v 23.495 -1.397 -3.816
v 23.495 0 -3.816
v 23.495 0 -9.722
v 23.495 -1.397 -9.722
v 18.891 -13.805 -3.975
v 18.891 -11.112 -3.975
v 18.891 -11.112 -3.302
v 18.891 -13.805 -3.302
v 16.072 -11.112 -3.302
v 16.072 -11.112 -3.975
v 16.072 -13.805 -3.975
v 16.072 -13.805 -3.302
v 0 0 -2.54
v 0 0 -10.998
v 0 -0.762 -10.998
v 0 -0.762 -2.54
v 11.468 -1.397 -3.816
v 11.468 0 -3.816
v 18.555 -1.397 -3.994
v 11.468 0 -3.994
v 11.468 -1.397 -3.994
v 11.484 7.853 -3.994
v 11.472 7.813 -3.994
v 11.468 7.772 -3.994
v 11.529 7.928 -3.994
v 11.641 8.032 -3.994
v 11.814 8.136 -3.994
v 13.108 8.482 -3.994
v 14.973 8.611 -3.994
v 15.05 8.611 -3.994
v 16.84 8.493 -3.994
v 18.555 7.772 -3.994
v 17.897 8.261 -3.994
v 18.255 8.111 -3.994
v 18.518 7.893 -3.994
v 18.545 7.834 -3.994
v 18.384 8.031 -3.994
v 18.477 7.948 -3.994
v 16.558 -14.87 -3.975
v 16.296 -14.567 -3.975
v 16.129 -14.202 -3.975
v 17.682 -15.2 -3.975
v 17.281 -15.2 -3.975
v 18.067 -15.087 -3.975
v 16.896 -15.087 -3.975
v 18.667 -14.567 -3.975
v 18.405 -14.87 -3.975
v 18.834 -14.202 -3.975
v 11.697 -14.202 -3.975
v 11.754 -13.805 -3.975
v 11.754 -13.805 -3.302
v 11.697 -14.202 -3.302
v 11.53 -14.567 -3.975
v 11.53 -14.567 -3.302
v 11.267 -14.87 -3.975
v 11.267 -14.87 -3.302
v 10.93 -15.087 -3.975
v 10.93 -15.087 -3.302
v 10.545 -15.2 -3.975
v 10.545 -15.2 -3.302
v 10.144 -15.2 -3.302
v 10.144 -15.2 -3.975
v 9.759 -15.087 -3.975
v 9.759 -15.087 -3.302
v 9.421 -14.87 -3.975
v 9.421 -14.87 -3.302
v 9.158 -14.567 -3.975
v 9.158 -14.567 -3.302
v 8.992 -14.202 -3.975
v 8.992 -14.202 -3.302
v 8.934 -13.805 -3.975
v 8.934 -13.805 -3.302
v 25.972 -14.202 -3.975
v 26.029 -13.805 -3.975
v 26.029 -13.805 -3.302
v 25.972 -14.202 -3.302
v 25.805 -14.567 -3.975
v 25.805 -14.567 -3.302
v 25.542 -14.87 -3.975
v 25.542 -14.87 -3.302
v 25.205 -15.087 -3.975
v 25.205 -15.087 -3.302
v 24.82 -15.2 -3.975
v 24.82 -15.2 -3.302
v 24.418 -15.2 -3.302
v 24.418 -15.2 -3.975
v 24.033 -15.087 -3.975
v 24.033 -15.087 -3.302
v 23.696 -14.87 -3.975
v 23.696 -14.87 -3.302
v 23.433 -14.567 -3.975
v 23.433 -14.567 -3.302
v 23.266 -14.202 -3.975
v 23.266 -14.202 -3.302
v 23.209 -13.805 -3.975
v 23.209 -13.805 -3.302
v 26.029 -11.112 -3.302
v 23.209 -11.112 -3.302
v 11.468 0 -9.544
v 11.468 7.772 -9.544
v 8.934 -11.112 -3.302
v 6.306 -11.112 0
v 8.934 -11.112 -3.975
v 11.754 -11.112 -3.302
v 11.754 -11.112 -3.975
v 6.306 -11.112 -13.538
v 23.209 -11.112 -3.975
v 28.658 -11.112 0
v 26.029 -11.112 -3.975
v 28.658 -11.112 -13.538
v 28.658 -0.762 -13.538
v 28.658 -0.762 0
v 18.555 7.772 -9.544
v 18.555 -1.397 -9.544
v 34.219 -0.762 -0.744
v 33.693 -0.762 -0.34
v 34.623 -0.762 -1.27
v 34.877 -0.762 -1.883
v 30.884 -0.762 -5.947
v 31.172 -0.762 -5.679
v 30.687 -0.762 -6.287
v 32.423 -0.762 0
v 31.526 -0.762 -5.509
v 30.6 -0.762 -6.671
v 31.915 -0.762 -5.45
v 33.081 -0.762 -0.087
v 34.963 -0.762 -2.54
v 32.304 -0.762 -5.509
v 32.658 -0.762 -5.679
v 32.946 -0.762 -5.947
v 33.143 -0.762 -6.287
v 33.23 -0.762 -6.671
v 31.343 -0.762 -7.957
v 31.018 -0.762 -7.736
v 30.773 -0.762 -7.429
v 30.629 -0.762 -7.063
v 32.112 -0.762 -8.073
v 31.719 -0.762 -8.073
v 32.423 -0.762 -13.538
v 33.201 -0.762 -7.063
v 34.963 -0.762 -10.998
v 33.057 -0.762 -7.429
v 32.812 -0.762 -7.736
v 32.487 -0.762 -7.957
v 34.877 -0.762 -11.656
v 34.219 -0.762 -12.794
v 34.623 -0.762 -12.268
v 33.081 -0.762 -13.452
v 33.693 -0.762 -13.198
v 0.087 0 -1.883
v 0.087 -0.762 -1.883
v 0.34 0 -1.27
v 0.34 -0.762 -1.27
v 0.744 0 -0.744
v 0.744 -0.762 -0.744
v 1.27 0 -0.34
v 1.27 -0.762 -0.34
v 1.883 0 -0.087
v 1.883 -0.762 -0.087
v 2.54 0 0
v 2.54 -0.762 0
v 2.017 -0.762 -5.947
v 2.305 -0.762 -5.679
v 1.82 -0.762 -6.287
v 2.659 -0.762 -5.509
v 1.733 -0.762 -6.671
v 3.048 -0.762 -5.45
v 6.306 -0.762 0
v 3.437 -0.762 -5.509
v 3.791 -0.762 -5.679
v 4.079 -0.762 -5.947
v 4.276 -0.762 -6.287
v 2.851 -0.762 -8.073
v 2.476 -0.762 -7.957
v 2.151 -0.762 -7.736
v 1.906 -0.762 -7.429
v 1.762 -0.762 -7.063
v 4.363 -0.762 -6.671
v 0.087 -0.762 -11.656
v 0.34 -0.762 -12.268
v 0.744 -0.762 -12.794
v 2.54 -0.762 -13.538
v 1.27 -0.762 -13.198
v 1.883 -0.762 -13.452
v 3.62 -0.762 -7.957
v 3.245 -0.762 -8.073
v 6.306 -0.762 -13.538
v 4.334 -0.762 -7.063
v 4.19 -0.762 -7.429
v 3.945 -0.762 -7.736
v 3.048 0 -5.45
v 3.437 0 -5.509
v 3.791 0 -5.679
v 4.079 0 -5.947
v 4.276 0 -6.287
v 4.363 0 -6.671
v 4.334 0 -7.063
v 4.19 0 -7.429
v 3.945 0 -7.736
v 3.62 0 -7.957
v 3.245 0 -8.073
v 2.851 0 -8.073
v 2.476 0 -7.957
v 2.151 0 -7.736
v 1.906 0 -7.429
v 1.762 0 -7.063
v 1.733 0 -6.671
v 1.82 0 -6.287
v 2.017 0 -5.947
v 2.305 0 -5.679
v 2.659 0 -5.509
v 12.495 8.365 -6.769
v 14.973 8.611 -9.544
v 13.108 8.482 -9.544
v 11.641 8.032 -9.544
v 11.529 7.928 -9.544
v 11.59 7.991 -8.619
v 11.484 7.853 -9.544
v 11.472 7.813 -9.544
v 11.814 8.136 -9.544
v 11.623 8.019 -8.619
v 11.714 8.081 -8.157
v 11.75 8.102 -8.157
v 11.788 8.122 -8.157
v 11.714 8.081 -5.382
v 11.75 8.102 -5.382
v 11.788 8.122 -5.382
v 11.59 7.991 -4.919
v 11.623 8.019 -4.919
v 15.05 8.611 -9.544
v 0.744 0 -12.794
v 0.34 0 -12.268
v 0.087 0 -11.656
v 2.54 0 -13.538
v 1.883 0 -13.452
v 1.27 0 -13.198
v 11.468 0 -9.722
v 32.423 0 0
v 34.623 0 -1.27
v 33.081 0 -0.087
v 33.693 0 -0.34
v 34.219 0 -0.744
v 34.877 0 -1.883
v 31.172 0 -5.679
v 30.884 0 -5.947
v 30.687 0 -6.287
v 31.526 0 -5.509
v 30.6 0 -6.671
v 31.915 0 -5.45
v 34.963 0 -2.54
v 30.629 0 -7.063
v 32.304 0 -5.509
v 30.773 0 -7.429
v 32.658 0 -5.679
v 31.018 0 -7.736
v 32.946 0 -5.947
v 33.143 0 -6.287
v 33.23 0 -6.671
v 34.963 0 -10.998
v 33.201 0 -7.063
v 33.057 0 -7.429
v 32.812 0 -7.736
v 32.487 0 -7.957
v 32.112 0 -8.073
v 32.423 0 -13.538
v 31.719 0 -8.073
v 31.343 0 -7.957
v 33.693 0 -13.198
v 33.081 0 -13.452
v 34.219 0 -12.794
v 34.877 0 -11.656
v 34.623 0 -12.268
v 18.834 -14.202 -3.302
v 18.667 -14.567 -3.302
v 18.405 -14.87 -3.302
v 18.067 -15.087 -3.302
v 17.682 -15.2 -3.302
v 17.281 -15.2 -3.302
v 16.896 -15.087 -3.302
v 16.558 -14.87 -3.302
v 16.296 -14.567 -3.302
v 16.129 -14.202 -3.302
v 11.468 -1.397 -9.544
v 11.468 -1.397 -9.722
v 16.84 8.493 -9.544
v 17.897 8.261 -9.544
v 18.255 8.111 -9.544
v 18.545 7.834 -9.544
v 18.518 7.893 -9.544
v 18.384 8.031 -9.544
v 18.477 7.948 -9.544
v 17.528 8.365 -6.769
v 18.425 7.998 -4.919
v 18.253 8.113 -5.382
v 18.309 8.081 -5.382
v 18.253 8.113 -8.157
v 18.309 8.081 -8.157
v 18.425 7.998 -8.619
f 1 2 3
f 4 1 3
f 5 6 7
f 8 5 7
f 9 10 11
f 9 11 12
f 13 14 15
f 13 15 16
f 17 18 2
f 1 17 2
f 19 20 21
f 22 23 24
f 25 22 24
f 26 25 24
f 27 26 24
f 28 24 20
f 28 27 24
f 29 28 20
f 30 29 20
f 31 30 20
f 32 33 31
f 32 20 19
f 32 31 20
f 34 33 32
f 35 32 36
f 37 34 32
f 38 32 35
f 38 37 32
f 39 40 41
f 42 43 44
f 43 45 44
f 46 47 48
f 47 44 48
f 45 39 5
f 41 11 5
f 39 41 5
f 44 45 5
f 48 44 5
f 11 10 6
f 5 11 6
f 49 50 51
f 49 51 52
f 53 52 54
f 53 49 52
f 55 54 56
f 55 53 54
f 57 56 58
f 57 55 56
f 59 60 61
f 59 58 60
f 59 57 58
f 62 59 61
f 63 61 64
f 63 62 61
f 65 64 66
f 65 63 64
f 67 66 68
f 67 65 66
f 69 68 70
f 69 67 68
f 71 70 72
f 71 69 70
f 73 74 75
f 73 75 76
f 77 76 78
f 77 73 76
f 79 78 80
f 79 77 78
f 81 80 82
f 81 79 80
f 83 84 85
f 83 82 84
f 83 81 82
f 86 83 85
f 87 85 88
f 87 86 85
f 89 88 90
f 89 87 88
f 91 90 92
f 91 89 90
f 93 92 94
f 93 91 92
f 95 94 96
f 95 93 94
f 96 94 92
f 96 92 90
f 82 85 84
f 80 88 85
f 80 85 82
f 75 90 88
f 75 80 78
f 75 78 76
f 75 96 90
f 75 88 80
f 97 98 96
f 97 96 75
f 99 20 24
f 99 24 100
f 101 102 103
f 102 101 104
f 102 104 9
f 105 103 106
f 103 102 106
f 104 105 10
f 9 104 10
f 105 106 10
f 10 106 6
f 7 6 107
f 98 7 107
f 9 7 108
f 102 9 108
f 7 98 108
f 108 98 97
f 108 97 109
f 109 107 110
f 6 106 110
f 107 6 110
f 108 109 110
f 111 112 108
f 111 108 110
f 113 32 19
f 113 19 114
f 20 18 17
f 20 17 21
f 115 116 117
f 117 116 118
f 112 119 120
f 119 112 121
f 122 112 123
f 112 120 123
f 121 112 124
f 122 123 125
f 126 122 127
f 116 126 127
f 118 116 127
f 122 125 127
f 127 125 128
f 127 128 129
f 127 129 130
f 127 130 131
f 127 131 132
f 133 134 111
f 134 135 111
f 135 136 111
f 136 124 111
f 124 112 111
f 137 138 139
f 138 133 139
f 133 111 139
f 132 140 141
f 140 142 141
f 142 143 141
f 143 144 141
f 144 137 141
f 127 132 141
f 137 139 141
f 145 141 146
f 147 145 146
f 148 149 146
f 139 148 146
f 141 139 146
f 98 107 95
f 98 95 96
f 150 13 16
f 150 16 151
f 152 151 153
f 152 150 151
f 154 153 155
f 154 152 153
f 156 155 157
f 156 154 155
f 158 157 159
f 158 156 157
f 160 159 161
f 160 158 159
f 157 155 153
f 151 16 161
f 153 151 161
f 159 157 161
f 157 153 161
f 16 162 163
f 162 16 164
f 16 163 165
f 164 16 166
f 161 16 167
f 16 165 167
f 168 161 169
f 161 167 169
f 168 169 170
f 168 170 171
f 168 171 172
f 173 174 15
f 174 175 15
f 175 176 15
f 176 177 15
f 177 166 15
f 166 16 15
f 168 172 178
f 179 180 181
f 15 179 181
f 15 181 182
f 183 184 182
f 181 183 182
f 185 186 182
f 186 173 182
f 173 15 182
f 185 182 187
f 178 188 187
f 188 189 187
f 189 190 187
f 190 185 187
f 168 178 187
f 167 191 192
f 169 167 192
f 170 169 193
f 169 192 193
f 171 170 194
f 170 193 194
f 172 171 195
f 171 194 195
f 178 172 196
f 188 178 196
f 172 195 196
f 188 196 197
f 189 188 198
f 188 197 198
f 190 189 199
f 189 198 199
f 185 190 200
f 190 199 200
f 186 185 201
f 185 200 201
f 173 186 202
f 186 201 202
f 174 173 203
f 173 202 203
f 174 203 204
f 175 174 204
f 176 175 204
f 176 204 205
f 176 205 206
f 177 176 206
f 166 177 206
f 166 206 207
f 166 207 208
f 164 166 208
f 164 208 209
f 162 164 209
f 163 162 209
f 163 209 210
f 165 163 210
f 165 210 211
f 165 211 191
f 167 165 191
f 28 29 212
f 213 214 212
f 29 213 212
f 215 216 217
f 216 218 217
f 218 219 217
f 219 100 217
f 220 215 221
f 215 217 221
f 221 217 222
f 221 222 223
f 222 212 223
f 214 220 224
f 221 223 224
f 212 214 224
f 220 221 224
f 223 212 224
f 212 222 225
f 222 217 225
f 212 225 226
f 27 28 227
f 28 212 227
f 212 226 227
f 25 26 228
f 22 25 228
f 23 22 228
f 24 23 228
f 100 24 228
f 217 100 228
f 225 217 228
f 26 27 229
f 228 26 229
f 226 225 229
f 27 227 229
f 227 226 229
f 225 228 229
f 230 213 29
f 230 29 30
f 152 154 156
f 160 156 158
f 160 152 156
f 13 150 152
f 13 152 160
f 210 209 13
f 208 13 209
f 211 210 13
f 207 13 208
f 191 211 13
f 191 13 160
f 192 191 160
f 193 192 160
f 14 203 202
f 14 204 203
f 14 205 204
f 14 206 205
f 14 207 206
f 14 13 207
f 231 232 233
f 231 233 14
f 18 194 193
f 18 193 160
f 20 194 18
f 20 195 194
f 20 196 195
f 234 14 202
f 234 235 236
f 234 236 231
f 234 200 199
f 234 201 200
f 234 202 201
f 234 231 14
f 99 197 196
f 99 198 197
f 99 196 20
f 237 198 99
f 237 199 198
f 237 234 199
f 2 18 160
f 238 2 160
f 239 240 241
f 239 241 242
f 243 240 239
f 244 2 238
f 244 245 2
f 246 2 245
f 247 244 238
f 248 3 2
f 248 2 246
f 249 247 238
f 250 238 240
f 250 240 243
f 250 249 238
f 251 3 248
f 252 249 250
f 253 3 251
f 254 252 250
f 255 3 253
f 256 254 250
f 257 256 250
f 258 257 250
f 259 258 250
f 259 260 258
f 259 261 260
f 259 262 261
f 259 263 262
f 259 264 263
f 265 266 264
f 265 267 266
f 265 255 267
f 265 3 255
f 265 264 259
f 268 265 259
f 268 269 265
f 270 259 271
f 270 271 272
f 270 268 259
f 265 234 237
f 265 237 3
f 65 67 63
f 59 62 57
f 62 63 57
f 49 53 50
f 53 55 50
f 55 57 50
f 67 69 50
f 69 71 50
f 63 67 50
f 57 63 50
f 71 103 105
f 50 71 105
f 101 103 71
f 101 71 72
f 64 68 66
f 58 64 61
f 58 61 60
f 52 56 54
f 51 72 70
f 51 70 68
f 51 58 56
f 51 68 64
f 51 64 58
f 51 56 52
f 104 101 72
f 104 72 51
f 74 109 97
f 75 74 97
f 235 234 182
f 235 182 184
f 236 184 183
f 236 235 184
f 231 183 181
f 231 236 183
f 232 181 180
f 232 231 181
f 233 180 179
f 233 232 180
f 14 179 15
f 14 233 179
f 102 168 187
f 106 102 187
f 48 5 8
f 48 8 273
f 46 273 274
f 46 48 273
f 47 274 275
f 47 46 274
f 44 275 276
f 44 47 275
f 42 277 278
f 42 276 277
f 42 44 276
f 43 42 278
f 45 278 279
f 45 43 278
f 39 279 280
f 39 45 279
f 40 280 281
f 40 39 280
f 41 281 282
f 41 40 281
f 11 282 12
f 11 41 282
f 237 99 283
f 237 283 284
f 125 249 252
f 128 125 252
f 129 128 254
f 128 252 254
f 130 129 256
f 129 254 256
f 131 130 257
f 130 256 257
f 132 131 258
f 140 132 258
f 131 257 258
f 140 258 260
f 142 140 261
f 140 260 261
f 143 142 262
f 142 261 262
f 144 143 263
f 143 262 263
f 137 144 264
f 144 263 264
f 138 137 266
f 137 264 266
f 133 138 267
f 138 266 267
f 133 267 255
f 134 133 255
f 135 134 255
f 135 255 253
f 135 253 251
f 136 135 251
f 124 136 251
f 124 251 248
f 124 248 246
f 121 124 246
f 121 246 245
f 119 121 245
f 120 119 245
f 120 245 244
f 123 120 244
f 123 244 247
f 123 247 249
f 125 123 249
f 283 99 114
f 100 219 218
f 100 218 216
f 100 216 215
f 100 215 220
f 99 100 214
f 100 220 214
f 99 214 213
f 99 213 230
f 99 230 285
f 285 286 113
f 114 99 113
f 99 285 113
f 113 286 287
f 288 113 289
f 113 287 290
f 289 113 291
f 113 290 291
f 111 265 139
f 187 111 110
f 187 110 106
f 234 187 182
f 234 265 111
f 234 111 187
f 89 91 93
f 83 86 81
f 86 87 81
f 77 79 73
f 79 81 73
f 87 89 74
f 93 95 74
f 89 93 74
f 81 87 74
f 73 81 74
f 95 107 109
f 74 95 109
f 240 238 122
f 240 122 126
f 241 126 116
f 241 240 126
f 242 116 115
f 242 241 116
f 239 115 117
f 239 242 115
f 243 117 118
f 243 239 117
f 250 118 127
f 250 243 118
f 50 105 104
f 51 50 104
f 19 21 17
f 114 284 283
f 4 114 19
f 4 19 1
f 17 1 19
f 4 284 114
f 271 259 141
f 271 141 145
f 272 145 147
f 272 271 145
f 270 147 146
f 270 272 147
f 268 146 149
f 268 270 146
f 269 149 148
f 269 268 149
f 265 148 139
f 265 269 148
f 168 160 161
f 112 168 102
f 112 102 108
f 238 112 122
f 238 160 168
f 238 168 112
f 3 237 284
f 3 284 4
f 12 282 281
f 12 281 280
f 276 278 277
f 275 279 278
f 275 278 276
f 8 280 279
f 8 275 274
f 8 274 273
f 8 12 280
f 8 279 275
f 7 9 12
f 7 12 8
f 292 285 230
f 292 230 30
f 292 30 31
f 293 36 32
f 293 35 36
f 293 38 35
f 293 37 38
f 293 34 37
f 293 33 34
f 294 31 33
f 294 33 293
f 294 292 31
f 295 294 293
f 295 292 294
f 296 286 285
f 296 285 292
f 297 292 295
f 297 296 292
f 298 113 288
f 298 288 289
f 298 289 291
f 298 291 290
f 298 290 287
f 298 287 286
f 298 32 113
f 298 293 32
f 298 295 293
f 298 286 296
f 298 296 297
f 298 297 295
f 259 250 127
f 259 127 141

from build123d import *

# Parameters (mm, degrees)
BOSS_EXTRUDE1_DEPTH             = 0.762
SKETCH2_W                       = 22.352
SKETCH2_H                       = 13.5382
BOSS_EXTRUDE2_DEPTH             = 11.1125
SKETCH6_W                       = 12.0269
SKETCH6_H                       = 5.9055
CUT_EXTRUDE2_DEPTH              = 1.397
SKETCH3_W                       = 7.0866
SKETCH3_H                       = 5.5499
BOSS_EXTRUDE3_DEPTH             = 8.6106
BOSS_EXTRUDE3_DIRECTION_2_REACH = 41.105
FILLET4_SIZE                    = 3.5052
FILLET4_SIZE_2                  = 0.8382
SKETCH4_R                       = 1.318988248
CUT_EXTRUDE1_DEPTH              = 40.104844676
SKETCH5_W                       = 2.8194
SKETCH5_H                       = 0.6731
BOSS_EXTRUDE4_DEPTH             = 4.1021
FILLET5_RADIUS                  = 1.4097
FILLET5_LENGTH                  = 0.6731
FILLET6_RADIUS                  = 1.4097
FILLET6_LENGTH                  = 0.6731
FILLET7_RADIUS                  = 1.4097
FILLET7_LENGTH                  = 0.6731


with BuildPart() as part:
    # Sketch1 → Boss-Extrude1 (new body)
    with BuildSketch(Plane(origin=(0, 0, 0), x_dir=(1, 0, 0), z_dir=(0, 1, 0))):
        with BuildLine():
            Line((2.54, 0), (32.4231, 0))
            ThreePointArc((32.4231, 0), (34.219151224, 0.743948776), (34.9631, 2.54))
            Line((34.9631, 2.54), (34.9631, 10.9982))
            ThreePointArc((34.9631, 10.9982), (34.219151224, 12.794251224), (32.4231, 13.5382))
            Line((32.4231, 13.5382), (2.54, 13.5382))
            ThreePointArc((2.54, 13.5382), (0.743948776, 12.794251224), (0, 10.9982))
            Line((0, 10.9982), (0, 2.54))
            ThreePointArc((0, 2.54), (0.743948776, 0.743948776), (2.54, 0))
        make_face()
    extrude(amount=-BOSS_EXTRUDE1_DEPTH)

    # Sketch2 → Boss-Extrude2 (add)
    with BuildSketch(Plane(origin=(0, 0, 0), x_dir=(1, 0, 0), z_dir=(0, 1, 0))):
        with Locations((17.48155, 6.7691)):
            Rectangle(SKETCH2_W, SKETCH2_H)
    extrude(amount=-BOSS_EXTRUDE2_DEPTH)

    # Sketch6 → Cut-Extrude2 (cut)
    with BuildSketch(Plane(origin=(0, 0, 0), x_dir=(1, 0, 0), z_dir=(0, 1, 0))):
        with Locations((17.48155, 6.7691)):
            Rectangle(SKETCH6_W, SKETCH6_H)
    extrude(amount=-CUT_EXTRUDE2_DEPTH, mode=Mode.SUBTRACT)

    # Sketch3 → Boss-Extrude3 (add)
    with BuildSketch(Plane(origin=(0, 0, 0), x_dir=(1, 0, 0), z_dir=(0, 1, 0))):
        with Locations((15.0114, 6.7691)):
            Rectangle(SKETCH3_W, SKETCH3_H)
    extrude(amount=BOSS_EXTRUDE3_DEPTH)

    # Sketch3 → Boss-Extrude3 direction 2 (add, up to next)
    with BuildSketch(Plane(origin=(0, 0, 0), x_dir=(1, 0, 0), z_dir=(0, 1, 0)), mode=Mode.PRIVATE) as boss_extrude3_direction_2_sk1:
        with Locations((15.0114, 6.7691)):
            Rectangle(SKETCH3_W, SKETCH3_H)
    boss_extrude3_direction_2_tool1 = extrude(boss_extrude3_direction_2_sk1.sketch, amount=-BOSS_EXTRUDE3_DIRECTION_2_REACH, mode=Mode.PRIVATE) - part.part
    add(boss_extrude3_direction_2_tool1.solids().sort_by_distance((15.0114, 0, -6.7691))[0])

    # Fillet4
    # an asymmetric fillet: 3.5052, 0.8382 mm, written as the material it takes off along each edge
    with BuildSketch(Plane(origin=(18.5547, 8.6106, -18.30705), x_dir=(-1, 0, 0), z_dir=(0, 0, 1))) as fillet4_piece_1:
        with BuildLine():
            Bezier((FILLET4_SIZE, 0), (0, 0), (0, FILLET4_SIZE_2), weights=[1, 0.707106781, 1])
            Line((0, FILLET4_SIZE_2), (0, 0))
            Line((0, 0), (FILLET4_SIZE, 0))
        make_face()
    extrude(amount=23.0759, mode=Mode.SUBTRACT)
    with BuildSketch(Plane(origin=(11.4681, 8.6106, 4.76885), x_dir=(0, -1, 0), z_dir=(0, 0, -1))) as fillet4_piece_2:
        with BuildLine():
            Bezier((FILLET4_SIZE_2, 0), (0, 0), (0, -FILLET4_SIZE), weights=[1, 0.707106781, 1])
            Line((0, -FILLET4_SIZE), (0, 0))
            Line((0, 0), (FILLET4_SIZE_2, 0))
        make_face()
    extrude(amount=23.0759, mode=Mode.SUBTRACT)

    # Sketch4 → Cut-Extrude1 (cut, through all)
    with BuildSketch(Plane(origin=(0, 0, 0), x_dir=(1, 0, 0), z_dir=(0, 1, 0))):
        with Locations(Location((3.048, 6.7691, 0), (0, 0, 270))):
            Circle(SKETCH4_R)
        with Locations(Location((31.9151, 6.7691, 0), (0, 0, 270))):
            Circle(SKETCH4_R)
    extrude(amount=-CUT_EXTRUDE1_DEPTH, mode=Mode.SUBTRACT)

    # Sketch5 → Boss-Extrude4 (add)
    with BuildSketch(Plane.XZ.offset(11.1125)):
        with Locations((10.34415, -3.63855)):
            Rectangle(SKETCH5_W, SKETCH5_H)
        with Locations((17.48155, -3.63855)):
            Rectangle(SKETCH5_W, SKETCH5_H)
        with Locations((24.61895, -3.63855)):
            Rectangle(SKETCH5_W, SKETCH5_H)
    extrude(amount=BOSS_EXTRUDE4_DEPTH)

    # Fillet5: full round fillet: the end face becomes a half cylinder, R = half its width
    fillet5_face = Plane((10.34415, -15.2146, -3.63855), x_dir=(0, 0, -1), z_dir=(0, -1, 0))  # on the end face: x along it, z out of the body
    fillet5_slab = fillet5_face.offset(-FILLET5_RADIUS / 2) * Box(FILLET5_LENGTH, 2 * FILLET5_RADIUS, FILLET5_RADIUS, mode=Mode.PRIVATE)  # the body's end, R deep
    fillet5_round = Plane((10.34415, -13.8049, -3.63855), x_dir=(0, -1, 0), z_dir=(0, 0, -1)) * Cylinder(FILLET5_RADIUS, FILLET5_LENGTH, mode=Mode.PRIVATE)  # its axis R under the face
    add(fillet5_slab - fillet5_round, mode=Mode.SUBTRACT)

    # Fillet6: full round fillet: the end face becomes a half cylinder, R = half its width
    fillet6_face = Plane((17.48155, -15.2146, -3.63855), x_dir=(0, 0, -1), z_dir=(0, -1, 0))  # on the end face: x along it, z out of the body
    fillet6_slab = fillet6_face.offset(-FILLET6_RADIUS / 2) * Box(FILLET6_LENGTH, 2 * FILLET6_RADIUS, FILLET6_RADIUS, mode=Mode.PRIVATE)  # the body's end, R deep
    fillet6_round = Plane((17.48155, -13.8049, -3.63855), x_dir=(0, -1, 0), z_dir=(0, 0, -1)) * Cylinder(FILLET6_RADIUS, FILLET6_LENGTH, mode=Mode.PRIVATE)  # its axis R under the face
    add(fillet6_slab - fillet6_round, mode=Mode.SUBTRACT)

    # Fillet7: full round fillet: the end face becomes a half cylinder, R = half its width
    fillet7_face = Plane((24.61895, -15.2146, -3.63855), x_dir=(0, 0, -1), z_dir=(0, -1, 0))  # on the end face: x along it, z out of the body
    fillet7_slab = fillet7_face.offset(-FILLET7_RADIUS / 2) * Box(FILLET7_LENGTH, 2 * FILLET7_RADIUS, FILLET7_RADIUS, mode=Mode.PRIVATE)  # the body's end, R deep
    fillet7_round = Plane((24.61895, -13.8049, -3.63855), x_dir=(0, -1, 0), z_dir=(0, 0, -1)) * Cylinder(FILLET7_RADIUS, FILLET7_LENGTH, mode=Mode.PRIVATE)  # its axis R under the face
    add(fillet7_slab - fillet7_round, mode=Mode.SUBTRACT)


solid = part.part
